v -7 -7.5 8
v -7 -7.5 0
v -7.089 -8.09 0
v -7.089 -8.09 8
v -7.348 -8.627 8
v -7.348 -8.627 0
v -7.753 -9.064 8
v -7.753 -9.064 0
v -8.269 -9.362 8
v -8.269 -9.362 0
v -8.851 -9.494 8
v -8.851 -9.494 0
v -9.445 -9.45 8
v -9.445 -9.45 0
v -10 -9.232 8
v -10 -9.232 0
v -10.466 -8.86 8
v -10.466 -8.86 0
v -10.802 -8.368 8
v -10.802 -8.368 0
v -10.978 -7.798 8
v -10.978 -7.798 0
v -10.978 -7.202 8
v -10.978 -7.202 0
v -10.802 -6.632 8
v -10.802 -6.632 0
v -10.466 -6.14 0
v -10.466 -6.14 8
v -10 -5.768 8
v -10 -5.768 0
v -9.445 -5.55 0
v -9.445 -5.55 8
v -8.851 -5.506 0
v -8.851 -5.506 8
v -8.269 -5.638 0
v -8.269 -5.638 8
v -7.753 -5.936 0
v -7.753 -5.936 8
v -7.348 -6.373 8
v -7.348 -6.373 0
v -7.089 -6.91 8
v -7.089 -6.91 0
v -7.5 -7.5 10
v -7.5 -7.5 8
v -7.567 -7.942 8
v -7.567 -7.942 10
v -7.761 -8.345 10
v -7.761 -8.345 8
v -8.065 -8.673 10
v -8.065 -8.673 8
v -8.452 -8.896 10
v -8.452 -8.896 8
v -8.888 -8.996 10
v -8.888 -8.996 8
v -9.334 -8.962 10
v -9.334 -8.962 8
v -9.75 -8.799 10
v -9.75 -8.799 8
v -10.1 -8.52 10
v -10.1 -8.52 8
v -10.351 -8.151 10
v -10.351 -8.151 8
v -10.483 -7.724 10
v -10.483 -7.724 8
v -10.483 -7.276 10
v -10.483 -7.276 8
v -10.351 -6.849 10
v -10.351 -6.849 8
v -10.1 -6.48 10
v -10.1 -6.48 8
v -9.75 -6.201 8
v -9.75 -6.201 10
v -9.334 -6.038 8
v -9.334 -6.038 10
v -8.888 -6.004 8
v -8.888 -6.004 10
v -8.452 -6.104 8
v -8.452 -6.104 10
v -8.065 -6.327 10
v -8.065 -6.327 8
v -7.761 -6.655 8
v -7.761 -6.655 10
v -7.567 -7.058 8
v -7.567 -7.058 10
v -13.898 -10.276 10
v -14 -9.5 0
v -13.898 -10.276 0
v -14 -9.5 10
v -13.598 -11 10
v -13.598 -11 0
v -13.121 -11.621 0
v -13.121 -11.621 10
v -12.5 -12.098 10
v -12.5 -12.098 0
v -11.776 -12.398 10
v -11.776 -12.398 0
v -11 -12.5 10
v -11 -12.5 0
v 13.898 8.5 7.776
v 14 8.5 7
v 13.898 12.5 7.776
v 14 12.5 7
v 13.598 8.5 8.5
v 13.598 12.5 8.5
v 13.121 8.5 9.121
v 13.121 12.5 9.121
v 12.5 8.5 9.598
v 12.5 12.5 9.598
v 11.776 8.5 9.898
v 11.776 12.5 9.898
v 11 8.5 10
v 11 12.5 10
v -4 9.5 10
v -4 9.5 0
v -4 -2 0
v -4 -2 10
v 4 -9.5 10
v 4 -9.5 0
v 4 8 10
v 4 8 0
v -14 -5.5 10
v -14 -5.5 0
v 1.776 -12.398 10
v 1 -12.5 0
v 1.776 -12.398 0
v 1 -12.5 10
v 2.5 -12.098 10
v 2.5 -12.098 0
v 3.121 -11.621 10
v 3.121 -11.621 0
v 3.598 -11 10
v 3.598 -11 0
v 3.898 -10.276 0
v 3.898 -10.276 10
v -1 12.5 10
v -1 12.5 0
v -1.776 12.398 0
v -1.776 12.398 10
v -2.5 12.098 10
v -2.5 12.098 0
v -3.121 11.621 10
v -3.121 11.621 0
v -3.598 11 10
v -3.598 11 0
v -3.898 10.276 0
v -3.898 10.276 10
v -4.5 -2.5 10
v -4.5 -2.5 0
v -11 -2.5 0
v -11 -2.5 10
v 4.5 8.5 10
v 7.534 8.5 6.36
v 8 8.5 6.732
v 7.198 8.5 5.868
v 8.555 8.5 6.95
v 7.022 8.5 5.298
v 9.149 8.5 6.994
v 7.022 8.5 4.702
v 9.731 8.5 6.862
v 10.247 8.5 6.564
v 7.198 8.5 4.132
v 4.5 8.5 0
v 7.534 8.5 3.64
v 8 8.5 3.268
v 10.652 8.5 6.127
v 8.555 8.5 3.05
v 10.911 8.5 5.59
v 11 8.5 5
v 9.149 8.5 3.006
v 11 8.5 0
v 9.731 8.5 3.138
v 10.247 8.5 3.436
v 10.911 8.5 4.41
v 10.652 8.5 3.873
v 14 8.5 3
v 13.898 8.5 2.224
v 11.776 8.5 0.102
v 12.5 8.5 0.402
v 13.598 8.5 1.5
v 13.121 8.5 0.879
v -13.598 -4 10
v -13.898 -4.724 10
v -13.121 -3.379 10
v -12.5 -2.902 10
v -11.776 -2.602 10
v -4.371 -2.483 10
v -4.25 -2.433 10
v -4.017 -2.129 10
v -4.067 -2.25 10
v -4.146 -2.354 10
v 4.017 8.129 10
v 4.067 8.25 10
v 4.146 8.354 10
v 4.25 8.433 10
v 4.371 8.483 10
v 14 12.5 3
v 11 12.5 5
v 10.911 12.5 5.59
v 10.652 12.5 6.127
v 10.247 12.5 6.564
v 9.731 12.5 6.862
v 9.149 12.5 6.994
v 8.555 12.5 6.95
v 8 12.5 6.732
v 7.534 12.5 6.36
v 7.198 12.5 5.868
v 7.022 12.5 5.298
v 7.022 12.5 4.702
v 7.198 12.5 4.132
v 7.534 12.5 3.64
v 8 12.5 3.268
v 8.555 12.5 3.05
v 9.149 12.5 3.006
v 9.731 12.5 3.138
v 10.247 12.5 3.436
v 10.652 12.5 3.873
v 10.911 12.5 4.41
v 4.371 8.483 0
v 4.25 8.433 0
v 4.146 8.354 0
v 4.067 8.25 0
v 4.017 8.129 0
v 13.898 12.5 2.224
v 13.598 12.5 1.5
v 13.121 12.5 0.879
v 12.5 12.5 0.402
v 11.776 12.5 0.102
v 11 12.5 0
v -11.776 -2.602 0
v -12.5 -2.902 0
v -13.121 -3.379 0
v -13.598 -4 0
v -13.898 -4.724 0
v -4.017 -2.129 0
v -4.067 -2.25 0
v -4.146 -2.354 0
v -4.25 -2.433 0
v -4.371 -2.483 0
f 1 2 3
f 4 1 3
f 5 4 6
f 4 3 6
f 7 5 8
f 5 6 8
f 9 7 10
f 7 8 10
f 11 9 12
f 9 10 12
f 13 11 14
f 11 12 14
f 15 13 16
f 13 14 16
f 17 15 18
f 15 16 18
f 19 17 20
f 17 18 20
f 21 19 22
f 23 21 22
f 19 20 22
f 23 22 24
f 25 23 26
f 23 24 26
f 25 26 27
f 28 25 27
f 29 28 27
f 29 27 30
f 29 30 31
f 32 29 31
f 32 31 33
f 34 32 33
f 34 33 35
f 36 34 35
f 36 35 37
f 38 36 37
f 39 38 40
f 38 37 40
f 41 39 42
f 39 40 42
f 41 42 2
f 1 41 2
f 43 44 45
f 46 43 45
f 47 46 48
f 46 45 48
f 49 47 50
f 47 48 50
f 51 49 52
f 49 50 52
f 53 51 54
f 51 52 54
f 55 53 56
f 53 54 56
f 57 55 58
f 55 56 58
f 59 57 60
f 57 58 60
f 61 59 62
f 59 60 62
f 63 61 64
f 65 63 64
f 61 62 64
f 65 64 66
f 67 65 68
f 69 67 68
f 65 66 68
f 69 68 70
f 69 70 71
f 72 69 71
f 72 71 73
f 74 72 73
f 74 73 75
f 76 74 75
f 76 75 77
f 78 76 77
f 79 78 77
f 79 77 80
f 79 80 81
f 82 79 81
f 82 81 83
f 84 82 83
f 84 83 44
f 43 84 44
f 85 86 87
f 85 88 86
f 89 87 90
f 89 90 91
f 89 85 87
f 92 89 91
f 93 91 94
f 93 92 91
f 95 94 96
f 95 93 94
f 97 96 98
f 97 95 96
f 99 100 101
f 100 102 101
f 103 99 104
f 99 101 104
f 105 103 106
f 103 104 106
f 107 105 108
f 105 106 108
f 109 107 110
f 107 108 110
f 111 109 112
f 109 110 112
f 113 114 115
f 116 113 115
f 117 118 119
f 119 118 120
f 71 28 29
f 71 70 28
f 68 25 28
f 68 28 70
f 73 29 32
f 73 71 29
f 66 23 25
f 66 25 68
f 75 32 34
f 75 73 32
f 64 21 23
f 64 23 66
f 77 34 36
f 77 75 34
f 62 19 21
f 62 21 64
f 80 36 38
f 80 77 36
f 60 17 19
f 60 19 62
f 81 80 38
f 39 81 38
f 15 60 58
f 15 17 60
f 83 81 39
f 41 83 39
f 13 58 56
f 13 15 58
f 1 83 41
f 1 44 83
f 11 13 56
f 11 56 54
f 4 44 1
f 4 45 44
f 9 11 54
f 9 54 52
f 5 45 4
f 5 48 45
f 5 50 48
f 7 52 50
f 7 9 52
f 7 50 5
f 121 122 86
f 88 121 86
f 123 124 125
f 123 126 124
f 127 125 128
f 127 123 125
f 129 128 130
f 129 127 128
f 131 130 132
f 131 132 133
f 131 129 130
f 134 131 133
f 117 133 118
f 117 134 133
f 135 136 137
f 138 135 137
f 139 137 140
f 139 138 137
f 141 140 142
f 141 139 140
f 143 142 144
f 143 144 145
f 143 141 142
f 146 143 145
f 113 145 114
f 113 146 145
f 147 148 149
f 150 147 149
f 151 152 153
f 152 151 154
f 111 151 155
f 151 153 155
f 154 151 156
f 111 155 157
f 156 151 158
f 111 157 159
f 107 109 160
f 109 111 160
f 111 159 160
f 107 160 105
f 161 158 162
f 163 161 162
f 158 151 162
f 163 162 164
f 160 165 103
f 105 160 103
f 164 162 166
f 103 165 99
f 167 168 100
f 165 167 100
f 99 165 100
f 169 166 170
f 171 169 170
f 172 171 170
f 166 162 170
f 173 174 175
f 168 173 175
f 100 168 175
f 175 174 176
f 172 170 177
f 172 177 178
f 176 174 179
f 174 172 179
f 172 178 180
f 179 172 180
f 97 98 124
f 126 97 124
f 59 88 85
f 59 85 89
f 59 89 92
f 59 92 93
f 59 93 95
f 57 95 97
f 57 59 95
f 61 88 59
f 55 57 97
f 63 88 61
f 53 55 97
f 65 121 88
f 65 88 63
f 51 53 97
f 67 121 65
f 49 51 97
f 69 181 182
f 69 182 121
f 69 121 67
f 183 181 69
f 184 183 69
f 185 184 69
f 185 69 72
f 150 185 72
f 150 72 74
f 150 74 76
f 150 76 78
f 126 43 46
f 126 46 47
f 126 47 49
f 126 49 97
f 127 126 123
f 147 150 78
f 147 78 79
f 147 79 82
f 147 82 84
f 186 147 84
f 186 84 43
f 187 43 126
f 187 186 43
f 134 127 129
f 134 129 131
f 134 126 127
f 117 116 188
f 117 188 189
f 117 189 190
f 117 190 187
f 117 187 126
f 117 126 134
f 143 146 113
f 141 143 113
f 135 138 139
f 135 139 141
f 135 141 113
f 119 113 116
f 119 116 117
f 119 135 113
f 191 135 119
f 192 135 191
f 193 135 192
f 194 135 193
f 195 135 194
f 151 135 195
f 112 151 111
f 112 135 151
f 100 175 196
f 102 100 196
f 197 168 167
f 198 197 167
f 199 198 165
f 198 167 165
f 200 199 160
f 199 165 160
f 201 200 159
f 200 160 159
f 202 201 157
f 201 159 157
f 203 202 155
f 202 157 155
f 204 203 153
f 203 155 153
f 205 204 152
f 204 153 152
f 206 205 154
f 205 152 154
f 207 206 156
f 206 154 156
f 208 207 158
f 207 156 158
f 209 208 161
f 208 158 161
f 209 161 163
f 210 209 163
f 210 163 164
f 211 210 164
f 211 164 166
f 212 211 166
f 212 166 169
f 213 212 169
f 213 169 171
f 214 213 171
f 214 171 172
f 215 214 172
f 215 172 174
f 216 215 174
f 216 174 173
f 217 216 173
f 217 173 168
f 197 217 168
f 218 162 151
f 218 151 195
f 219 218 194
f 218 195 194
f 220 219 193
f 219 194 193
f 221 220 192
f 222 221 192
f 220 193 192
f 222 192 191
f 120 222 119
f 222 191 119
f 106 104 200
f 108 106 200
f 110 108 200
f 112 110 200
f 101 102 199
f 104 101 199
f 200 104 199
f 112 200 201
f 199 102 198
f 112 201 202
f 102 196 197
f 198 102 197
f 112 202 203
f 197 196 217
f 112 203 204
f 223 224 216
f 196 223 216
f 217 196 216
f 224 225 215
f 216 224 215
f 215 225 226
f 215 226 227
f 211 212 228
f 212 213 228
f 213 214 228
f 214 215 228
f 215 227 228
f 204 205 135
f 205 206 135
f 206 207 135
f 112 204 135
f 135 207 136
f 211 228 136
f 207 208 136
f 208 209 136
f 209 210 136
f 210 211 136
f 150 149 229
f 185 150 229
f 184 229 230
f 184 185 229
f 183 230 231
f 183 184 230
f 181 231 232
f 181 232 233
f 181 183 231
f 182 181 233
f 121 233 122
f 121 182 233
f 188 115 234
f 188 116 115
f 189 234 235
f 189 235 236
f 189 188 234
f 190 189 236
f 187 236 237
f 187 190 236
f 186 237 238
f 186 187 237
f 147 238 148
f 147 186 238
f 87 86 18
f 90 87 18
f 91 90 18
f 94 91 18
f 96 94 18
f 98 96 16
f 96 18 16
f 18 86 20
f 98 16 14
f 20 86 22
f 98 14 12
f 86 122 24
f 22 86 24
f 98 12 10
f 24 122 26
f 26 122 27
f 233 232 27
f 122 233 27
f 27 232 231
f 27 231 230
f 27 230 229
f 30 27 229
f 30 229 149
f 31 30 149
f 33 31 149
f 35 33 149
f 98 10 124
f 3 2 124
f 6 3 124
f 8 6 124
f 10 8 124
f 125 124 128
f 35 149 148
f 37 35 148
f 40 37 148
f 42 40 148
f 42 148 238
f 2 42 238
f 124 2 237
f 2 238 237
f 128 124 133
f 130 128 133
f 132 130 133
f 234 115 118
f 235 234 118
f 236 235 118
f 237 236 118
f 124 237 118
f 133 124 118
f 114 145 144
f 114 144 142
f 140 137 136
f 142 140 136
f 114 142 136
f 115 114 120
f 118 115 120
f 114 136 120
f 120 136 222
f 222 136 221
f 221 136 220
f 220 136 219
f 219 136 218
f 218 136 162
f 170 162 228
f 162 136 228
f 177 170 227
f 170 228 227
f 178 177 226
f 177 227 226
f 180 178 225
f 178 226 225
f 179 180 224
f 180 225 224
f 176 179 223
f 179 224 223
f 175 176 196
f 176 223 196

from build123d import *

# Parameters (mm, degrees)
F1_DEPTH = 10
F2_R     = 3
F3_R     = 1.5
F4_DEPTH = 10.001
F5_R     = 2
F6_DEPTH = 8
F7_R     = 3
F8_R     = 2
F9_DEPTH = 4.001
F10_R    = 3
F11_R    = 0.5


with BuildPart() as f1:
    # F0 (on Top) → F1 (new body)
    with BuildSketch(Plane.XY):
        Polygon((14, 12.5), (4, 12.5), (-4, 12.5), (-4, -2.5), (-14, -2.5), (-14, -12.5), (-4, -12.5), (4, -12.5), (4, 8.5), (14, 8.5), align=None)
    extrude(amount=F1_DEPTH)

    # F2
    f2_edges = [f1.edges().sort_by_distance(p)[0] for p in [
        (-4, 12.5, 5),
        (4, -12.5, 5),
    ]]
    fillet(f2_edges, radius=F2_R)

    # F3 (on face) → F4 (cut, through all)
    with BuildSketch(Plane(origin=(0, 0, 0), x_dir=(1, 0, 0), z_dir=(0, 0, -1))):
        with Locations((-9, 7.5)):
            Circle(F3_R)
    extrude(amount=-F4_DEPTH, mode=Mode.SUBTRACT)

    # F5 (on face) → F6 (cut)
    with BuildSketch(Plane(origin=(0, 0, 0), x_dir=(1, 0, 0), z_dir=(0, 0, -1))):
        with Locations((-9, 7.5)):
            Circle(F5_R)
    extrude(amount=-F6_DEPTH, mode=Mode.SUBTRACT)

    # F7
    f7_edges = [f1.edges().sort_by_distance(p)[0] for p in [
        (-14, -2.5, 5),
        (-14, -12.5, 5),
    ]]
    fillet(f7_edges, radius=F7_R)

    # F8 (on face) → F9 (cut, through all)
    with BuildSketch(Plane.XZ.offset(-8.5)):
        with Locations((9, 5)):
            Circle(F8_R)
    extrude(amount=-F9_DEPTH, mode=Mode.SUBTRACT)

    # F10
    f10_edges = [f1.edges().sort_by_distance(p)[0] for p in [
        (14, 10.5, 0),
        (14, 10.5, 10),
    ]]
    fillet(f10_edges, radius=F10_R)

    # F11
    f11_edges = [f1.edges().sort_by_distance(p)[0] for p in [
        (4, 8.5, 5),
        (-4, -2.5, 5),
    ]]
    fillet(f11_edges, radius=F11_R)


solid = f1.part
